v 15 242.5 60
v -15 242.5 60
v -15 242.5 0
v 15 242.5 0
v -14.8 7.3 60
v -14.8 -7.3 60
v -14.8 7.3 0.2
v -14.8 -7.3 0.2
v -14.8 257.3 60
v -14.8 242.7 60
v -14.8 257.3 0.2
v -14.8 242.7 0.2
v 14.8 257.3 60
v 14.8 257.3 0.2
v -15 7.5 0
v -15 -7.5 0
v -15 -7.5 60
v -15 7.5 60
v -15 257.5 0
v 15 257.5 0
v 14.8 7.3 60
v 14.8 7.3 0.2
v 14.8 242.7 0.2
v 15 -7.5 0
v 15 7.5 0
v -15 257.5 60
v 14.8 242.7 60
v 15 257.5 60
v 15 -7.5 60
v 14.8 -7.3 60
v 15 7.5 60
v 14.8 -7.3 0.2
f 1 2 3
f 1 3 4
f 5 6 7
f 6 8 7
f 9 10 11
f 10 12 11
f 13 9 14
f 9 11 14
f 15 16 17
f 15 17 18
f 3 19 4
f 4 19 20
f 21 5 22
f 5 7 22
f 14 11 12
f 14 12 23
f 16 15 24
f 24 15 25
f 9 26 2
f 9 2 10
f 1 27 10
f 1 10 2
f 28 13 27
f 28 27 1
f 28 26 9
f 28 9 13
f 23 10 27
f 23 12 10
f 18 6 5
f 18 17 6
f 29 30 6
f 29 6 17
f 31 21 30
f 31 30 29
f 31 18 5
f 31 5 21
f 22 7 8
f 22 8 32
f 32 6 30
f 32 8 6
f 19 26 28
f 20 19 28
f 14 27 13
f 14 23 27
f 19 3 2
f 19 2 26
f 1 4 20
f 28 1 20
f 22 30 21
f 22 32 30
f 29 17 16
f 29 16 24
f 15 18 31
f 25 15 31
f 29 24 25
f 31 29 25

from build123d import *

# Parameters (mm, degrees)
F0_W     = 30
F0_H     = 15
F1_DEPTH = 60
F2_T     = -0.2
F2_2_T   = -0.2


with BuildPart() as f1:
    # F0 (on Top) → F1 (new body)
    with BuildSketch(Plane.XY):
        Rectangle(F0_W, F0_H)
    extrude(amount=F1_DEPTH)

    # F2
    f2_openings = [f1.faces().sort_by_distance(p)[0] for p in [
        (0, 0, 60),
    ]]
    offset(amount=F2_T, openings=f2_openings)


with BuildPart() as f1b:
    # F0 (on Top) → F1, piece 2 (new body)
    with BuildSketch(Plane.XY):
        with Locations((0, 250)):
            Rectangle(F0_W, F0_H)
    extrude(amount=F1_DEPTH)

    # F2#2
    f2_2_openings = [f1b.faces().sort_by_distance(p)[0] for p in [
        (0, 250, 60),
    ]]
    offset(amount=F2_2_T, openings=f2_2_openings)


solid = Compound([f1.part, f1b.part])
